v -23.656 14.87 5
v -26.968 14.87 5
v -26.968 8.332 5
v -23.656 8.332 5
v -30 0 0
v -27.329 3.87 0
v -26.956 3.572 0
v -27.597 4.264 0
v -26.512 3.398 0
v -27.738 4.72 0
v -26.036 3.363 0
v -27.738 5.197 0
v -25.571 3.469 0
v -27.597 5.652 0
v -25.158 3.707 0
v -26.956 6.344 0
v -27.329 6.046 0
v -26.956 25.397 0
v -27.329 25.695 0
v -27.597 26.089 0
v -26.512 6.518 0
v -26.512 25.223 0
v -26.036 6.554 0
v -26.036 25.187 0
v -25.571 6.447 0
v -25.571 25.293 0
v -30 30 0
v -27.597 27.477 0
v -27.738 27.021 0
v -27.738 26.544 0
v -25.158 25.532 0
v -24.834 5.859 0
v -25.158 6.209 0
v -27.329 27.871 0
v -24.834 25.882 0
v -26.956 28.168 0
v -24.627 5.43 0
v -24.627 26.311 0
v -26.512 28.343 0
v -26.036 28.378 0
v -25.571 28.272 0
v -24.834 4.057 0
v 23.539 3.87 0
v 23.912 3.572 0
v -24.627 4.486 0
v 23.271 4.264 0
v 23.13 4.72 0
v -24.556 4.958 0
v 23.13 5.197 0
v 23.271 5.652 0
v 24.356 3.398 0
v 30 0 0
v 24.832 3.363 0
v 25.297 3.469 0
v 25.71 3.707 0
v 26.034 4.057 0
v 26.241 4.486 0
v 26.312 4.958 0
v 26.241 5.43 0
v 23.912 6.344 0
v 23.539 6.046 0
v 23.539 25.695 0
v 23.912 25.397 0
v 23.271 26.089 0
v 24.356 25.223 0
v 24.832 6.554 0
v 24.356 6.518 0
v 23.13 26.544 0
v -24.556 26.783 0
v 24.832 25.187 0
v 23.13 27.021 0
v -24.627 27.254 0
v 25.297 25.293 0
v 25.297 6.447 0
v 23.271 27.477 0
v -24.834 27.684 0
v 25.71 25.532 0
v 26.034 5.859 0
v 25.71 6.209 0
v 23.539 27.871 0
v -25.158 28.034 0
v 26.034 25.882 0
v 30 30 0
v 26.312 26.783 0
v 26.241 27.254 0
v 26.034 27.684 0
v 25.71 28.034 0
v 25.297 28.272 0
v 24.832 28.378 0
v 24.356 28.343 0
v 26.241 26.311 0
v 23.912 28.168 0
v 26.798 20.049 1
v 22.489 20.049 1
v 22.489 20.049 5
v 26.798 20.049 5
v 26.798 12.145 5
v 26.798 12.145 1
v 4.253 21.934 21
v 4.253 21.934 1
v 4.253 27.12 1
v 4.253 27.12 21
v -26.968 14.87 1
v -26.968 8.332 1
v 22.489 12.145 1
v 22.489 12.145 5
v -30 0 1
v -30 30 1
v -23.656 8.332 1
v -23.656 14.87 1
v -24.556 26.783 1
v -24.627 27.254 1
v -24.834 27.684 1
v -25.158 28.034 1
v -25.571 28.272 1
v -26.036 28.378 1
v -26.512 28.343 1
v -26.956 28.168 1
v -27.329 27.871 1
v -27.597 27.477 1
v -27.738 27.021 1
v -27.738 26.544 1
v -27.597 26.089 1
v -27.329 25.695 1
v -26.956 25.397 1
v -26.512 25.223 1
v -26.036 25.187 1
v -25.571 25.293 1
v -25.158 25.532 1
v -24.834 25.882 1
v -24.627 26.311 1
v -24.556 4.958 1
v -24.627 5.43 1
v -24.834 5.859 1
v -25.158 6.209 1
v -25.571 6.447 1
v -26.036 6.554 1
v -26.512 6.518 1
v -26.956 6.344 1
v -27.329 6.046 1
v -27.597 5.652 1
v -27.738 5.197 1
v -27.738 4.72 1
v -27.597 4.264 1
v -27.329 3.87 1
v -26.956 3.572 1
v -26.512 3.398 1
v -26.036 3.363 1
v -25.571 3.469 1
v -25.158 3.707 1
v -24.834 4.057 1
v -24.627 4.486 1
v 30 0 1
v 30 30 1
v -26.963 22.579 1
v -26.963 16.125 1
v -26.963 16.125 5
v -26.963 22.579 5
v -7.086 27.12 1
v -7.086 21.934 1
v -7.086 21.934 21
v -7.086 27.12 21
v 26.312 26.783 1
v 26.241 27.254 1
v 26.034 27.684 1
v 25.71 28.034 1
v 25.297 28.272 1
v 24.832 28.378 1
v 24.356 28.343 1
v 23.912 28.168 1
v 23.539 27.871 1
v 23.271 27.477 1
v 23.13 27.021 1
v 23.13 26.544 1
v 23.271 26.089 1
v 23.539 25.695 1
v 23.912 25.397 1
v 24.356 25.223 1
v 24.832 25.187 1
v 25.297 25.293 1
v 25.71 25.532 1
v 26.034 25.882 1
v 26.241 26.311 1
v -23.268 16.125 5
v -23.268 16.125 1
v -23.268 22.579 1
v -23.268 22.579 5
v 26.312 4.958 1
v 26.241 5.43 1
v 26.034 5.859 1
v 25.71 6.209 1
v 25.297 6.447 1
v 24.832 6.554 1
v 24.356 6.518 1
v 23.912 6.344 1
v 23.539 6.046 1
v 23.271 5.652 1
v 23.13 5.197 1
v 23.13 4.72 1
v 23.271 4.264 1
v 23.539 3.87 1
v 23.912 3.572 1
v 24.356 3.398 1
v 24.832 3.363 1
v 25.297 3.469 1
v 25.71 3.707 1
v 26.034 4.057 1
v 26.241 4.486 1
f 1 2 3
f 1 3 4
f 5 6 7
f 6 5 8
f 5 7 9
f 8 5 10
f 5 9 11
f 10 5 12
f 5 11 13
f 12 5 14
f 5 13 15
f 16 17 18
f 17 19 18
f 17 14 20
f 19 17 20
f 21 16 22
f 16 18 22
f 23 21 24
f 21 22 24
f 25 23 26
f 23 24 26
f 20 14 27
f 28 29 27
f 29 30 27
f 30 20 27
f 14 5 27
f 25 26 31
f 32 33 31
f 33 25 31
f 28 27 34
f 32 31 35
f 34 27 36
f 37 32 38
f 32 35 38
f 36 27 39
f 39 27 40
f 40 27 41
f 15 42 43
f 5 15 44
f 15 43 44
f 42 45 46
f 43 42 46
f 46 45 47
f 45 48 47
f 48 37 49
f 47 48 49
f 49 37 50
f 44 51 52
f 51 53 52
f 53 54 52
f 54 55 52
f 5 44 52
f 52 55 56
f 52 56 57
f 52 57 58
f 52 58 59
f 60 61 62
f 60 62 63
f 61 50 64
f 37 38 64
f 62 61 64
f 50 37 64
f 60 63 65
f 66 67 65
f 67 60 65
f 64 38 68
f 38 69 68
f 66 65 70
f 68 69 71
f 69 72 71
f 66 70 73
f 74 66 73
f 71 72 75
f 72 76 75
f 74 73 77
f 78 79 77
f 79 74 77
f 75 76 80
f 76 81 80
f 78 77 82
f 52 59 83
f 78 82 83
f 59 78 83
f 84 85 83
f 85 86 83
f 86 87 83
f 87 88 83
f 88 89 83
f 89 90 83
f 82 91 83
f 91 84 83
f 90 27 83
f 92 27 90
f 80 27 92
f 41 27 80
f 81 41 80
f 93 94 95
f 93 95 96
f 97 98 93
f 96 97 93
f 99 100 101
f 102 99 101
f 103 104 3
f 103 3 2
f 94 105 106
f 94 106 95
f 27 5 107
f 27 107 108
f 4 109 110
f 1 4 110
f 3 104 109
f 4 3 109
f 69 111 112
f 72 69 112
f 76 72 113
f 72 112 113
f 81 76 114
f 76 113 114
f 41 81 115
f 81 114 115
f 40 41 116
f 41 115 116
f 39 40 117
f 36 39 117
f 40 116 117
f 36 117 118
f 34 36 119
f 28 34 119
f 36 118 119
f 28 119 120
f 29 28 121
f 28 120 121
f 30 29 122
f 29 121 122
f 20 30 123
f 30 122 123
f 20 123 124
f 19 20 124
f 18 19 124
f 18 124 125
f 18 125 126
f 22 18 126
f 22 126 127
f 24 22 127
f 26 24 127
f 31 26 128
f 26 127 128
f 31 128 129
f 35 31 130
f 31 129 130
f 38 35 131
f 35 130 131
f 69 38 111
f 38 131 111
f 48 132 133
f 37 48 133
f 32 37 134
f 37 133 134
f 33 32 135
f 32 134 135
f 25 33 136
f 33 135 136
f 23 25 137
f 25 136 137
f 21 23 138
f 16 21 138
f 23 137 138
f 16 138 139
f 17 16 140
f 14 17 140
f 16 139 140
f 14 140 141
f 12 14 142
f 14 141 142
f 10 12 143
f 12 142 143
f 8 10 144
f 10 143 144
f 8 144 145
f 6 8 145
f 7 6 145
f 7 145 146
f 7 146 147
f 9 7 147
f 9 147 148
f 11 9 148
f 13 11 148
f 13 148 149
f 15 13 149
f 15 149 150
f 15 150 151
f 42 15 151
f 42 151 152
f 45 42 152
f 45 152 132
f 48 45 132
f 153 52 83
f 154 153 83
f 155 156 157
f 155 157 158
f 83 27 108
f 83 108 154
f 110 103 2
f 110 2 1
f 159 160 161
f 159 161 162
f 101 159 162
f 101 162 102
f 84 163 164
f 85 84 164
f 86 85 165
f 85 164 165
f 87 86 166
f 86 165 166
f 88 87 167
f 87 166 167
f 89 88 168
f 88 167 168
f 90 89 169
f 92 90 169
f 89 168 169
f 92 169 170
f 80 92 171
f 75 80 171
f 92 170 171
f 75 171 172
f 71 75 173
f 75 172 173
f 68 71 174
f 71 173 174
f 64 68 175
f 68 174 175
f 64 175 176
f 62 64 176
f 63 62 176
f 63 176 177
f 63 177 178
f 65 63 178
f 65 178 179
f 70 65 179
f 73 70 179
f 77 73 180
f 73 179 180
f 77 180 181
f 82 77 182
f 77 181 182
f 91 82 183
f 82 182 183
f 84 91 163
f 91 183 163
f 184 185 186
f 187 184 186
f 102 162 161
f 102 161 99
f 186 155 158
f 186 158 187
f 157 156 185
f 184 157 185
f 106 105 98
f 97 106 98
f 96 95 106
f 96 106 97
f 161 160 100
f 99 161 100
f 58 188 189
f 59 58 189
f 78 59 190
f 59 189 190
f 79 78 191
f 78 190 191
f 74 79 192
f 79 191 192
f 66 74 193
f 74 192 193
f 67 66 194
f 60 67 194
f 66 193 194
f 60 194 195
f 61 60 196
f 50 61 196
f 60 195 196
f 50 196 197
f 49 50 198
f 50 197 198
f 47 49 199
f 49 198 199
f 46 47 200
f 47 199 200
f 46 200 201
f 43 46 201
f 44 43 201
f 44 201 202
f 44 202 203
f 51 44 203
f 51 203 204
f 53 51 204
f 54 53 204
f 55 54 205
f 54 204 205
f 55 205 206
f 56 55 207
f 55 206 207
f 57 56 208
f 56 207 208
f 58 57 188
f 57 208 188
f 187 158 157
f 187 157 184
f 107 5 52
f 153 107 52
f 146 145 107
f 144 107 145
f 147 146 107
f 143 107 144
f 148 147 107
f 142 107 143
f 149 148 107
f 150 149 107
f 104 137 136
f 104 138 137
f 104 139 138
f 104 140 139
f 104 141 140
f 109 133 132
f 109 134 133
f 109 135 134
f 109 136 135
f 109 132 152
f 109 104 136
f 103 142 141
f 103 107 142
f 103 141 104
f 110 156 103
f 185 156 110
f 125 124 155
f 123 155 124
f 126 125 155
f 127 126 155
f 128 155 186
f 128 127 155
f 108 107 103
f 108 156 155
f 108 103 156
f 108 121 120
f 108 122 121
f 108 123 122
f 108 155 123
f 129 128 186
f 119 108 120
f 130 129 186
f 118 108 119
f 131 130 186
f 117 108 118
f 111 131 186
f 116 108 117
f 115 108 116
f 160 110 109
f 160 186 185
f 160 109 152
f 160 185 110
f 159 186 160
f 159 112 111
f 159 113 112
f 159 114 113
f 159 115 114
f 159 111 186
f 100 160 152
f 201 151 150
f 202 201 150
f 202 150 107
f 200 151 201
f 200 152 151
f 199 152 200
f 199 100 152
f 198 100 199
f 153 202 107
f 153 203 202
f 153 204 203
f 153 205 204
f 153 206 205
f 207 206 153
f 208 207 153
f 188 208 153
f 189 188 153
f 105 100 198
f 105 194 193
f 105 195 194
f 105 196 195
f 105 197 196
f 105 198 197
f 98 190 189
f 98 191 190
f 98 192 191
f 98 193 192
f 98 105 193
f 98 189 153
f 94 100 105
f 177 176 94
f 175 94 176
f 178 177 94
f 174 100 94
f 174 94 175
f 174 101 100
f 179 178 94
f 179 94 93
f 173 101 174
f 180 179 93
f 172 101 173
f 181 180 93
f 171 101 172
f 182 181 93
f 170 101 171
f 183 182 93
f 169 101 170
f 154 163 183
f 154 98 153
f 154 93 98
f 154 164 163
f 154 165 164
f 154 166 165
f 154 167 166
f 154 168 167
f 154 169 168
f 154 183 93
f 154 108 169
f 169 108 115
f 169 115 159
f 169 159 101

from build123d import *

# Parameters (mm, degrees)
SKETCH_1_W          = 60
SKETCH_1_H          = 30
EXTRUDE_1_DEPTH     = 1
CUT_EXTRUDE_1_REACH = 44.438
SKETCH_2_R          = 1.6
SKETCH_2_3_R        = 1.6
CUT_EXTRUDE_2_DEPTH = 1
SKETCH_3_W          = 11.33901572
SKETCH_3_H          = 5.18636438
EXTRUDE_2_DEPTH     = 20
SKETCH_5_W          = 3.694083694
SKETCH_5_H          = 6.454031282
SKETCH_5_W_2        = 3.311937105
SKETCH_5_H_2        = 6.538952746
SKETCH_5_W_3        = 4.308869274
SKETCH_5_H_3        = 7.904993255
EXTRUDE_3_DEPTH     = 5


with BuildPart() as part:
    # 草图1 → 凸台-拉伸1 (new body)
    with BuildSketch(Plane.XY):
        with Locations((0, 15)):
            Rectangle(SKETCH_1_W, SKETCH_1_H)
    extrude(amount=EXTRUDE_1_DEPTH)

    # 草图2 → 切除-拉伸1 (cut, up to next)
    with BuildSketch(Plane.XY.offset(1), mode=Mode.PRIVATE) as cut_extrude_1_sk1:
        with Locations((-26.155810983, 4.958036855)):
            Circle(SKETCH_2_R)
    cut_extrude_1_tool1 = extrude(cut_extrude_1_sk1.sketch, amount=-CUT_EXTRUDE_1_REACH, mode=Mode.PRIVATE) & part.part
    add(cut_extrude_1_tool1.solids().sort_by_distance((-26.155811, 4.958037, 1))[0], mode=Mode.SUBTRACT)

    # 草图2<3> → 切除-拉伸2 (cut)
    with BuildSketch(Plane.XY.offset(1)):
        with Locations((-26.155810983, 26.782853162)):
            Circle(SKETCH_2_3_R)
        with Locations((-26.155810983, 4.958036855)):
            Circle(SKETCH_2_3_R)
        with Locations((24.712146091, 26.782853162)):
            Circle(SKETCH_2_3_R)
        with Locations((24.712146091, 4.958036855)):
            Circle(SKETCH_2_3_R)
    extrude(amount=-CUT_EXTRUDE_2_DEPTH, mode=Mode.SUBTRACT)

    # 草图3 → 凸台-拉伸2 (add)
    with BuildSketch(Plane.XY.offset(1)):
        with Locations((-1.41614663, 24.527155888)):
            Rectangle(SKETCH_3_W, SKETCH_3_H)
    extrude(amount=EXTRUDE_2_DEPTH)

    # 草图5 → 凸台-拉伸3 (add)
    with BuildSketch(Plane.XY):
        with Locations((-25.115523047, 19.352225042)):
            Rectangle(SKETCH_5_W, SKETCH_5_H)
        with Locations((-25.311844501, 11.600994733)):
            Rectangle(SKETCH_5_W_2, SKETCH_5_H_2)
        with Locations((24.643382961, 16.097003055)):
            Rectangle(SKETCH_5_W_3, SKETCH_5_H_3)
    extrude(amount=EXTRUDE_3_DEPTH)


solid = part.part
